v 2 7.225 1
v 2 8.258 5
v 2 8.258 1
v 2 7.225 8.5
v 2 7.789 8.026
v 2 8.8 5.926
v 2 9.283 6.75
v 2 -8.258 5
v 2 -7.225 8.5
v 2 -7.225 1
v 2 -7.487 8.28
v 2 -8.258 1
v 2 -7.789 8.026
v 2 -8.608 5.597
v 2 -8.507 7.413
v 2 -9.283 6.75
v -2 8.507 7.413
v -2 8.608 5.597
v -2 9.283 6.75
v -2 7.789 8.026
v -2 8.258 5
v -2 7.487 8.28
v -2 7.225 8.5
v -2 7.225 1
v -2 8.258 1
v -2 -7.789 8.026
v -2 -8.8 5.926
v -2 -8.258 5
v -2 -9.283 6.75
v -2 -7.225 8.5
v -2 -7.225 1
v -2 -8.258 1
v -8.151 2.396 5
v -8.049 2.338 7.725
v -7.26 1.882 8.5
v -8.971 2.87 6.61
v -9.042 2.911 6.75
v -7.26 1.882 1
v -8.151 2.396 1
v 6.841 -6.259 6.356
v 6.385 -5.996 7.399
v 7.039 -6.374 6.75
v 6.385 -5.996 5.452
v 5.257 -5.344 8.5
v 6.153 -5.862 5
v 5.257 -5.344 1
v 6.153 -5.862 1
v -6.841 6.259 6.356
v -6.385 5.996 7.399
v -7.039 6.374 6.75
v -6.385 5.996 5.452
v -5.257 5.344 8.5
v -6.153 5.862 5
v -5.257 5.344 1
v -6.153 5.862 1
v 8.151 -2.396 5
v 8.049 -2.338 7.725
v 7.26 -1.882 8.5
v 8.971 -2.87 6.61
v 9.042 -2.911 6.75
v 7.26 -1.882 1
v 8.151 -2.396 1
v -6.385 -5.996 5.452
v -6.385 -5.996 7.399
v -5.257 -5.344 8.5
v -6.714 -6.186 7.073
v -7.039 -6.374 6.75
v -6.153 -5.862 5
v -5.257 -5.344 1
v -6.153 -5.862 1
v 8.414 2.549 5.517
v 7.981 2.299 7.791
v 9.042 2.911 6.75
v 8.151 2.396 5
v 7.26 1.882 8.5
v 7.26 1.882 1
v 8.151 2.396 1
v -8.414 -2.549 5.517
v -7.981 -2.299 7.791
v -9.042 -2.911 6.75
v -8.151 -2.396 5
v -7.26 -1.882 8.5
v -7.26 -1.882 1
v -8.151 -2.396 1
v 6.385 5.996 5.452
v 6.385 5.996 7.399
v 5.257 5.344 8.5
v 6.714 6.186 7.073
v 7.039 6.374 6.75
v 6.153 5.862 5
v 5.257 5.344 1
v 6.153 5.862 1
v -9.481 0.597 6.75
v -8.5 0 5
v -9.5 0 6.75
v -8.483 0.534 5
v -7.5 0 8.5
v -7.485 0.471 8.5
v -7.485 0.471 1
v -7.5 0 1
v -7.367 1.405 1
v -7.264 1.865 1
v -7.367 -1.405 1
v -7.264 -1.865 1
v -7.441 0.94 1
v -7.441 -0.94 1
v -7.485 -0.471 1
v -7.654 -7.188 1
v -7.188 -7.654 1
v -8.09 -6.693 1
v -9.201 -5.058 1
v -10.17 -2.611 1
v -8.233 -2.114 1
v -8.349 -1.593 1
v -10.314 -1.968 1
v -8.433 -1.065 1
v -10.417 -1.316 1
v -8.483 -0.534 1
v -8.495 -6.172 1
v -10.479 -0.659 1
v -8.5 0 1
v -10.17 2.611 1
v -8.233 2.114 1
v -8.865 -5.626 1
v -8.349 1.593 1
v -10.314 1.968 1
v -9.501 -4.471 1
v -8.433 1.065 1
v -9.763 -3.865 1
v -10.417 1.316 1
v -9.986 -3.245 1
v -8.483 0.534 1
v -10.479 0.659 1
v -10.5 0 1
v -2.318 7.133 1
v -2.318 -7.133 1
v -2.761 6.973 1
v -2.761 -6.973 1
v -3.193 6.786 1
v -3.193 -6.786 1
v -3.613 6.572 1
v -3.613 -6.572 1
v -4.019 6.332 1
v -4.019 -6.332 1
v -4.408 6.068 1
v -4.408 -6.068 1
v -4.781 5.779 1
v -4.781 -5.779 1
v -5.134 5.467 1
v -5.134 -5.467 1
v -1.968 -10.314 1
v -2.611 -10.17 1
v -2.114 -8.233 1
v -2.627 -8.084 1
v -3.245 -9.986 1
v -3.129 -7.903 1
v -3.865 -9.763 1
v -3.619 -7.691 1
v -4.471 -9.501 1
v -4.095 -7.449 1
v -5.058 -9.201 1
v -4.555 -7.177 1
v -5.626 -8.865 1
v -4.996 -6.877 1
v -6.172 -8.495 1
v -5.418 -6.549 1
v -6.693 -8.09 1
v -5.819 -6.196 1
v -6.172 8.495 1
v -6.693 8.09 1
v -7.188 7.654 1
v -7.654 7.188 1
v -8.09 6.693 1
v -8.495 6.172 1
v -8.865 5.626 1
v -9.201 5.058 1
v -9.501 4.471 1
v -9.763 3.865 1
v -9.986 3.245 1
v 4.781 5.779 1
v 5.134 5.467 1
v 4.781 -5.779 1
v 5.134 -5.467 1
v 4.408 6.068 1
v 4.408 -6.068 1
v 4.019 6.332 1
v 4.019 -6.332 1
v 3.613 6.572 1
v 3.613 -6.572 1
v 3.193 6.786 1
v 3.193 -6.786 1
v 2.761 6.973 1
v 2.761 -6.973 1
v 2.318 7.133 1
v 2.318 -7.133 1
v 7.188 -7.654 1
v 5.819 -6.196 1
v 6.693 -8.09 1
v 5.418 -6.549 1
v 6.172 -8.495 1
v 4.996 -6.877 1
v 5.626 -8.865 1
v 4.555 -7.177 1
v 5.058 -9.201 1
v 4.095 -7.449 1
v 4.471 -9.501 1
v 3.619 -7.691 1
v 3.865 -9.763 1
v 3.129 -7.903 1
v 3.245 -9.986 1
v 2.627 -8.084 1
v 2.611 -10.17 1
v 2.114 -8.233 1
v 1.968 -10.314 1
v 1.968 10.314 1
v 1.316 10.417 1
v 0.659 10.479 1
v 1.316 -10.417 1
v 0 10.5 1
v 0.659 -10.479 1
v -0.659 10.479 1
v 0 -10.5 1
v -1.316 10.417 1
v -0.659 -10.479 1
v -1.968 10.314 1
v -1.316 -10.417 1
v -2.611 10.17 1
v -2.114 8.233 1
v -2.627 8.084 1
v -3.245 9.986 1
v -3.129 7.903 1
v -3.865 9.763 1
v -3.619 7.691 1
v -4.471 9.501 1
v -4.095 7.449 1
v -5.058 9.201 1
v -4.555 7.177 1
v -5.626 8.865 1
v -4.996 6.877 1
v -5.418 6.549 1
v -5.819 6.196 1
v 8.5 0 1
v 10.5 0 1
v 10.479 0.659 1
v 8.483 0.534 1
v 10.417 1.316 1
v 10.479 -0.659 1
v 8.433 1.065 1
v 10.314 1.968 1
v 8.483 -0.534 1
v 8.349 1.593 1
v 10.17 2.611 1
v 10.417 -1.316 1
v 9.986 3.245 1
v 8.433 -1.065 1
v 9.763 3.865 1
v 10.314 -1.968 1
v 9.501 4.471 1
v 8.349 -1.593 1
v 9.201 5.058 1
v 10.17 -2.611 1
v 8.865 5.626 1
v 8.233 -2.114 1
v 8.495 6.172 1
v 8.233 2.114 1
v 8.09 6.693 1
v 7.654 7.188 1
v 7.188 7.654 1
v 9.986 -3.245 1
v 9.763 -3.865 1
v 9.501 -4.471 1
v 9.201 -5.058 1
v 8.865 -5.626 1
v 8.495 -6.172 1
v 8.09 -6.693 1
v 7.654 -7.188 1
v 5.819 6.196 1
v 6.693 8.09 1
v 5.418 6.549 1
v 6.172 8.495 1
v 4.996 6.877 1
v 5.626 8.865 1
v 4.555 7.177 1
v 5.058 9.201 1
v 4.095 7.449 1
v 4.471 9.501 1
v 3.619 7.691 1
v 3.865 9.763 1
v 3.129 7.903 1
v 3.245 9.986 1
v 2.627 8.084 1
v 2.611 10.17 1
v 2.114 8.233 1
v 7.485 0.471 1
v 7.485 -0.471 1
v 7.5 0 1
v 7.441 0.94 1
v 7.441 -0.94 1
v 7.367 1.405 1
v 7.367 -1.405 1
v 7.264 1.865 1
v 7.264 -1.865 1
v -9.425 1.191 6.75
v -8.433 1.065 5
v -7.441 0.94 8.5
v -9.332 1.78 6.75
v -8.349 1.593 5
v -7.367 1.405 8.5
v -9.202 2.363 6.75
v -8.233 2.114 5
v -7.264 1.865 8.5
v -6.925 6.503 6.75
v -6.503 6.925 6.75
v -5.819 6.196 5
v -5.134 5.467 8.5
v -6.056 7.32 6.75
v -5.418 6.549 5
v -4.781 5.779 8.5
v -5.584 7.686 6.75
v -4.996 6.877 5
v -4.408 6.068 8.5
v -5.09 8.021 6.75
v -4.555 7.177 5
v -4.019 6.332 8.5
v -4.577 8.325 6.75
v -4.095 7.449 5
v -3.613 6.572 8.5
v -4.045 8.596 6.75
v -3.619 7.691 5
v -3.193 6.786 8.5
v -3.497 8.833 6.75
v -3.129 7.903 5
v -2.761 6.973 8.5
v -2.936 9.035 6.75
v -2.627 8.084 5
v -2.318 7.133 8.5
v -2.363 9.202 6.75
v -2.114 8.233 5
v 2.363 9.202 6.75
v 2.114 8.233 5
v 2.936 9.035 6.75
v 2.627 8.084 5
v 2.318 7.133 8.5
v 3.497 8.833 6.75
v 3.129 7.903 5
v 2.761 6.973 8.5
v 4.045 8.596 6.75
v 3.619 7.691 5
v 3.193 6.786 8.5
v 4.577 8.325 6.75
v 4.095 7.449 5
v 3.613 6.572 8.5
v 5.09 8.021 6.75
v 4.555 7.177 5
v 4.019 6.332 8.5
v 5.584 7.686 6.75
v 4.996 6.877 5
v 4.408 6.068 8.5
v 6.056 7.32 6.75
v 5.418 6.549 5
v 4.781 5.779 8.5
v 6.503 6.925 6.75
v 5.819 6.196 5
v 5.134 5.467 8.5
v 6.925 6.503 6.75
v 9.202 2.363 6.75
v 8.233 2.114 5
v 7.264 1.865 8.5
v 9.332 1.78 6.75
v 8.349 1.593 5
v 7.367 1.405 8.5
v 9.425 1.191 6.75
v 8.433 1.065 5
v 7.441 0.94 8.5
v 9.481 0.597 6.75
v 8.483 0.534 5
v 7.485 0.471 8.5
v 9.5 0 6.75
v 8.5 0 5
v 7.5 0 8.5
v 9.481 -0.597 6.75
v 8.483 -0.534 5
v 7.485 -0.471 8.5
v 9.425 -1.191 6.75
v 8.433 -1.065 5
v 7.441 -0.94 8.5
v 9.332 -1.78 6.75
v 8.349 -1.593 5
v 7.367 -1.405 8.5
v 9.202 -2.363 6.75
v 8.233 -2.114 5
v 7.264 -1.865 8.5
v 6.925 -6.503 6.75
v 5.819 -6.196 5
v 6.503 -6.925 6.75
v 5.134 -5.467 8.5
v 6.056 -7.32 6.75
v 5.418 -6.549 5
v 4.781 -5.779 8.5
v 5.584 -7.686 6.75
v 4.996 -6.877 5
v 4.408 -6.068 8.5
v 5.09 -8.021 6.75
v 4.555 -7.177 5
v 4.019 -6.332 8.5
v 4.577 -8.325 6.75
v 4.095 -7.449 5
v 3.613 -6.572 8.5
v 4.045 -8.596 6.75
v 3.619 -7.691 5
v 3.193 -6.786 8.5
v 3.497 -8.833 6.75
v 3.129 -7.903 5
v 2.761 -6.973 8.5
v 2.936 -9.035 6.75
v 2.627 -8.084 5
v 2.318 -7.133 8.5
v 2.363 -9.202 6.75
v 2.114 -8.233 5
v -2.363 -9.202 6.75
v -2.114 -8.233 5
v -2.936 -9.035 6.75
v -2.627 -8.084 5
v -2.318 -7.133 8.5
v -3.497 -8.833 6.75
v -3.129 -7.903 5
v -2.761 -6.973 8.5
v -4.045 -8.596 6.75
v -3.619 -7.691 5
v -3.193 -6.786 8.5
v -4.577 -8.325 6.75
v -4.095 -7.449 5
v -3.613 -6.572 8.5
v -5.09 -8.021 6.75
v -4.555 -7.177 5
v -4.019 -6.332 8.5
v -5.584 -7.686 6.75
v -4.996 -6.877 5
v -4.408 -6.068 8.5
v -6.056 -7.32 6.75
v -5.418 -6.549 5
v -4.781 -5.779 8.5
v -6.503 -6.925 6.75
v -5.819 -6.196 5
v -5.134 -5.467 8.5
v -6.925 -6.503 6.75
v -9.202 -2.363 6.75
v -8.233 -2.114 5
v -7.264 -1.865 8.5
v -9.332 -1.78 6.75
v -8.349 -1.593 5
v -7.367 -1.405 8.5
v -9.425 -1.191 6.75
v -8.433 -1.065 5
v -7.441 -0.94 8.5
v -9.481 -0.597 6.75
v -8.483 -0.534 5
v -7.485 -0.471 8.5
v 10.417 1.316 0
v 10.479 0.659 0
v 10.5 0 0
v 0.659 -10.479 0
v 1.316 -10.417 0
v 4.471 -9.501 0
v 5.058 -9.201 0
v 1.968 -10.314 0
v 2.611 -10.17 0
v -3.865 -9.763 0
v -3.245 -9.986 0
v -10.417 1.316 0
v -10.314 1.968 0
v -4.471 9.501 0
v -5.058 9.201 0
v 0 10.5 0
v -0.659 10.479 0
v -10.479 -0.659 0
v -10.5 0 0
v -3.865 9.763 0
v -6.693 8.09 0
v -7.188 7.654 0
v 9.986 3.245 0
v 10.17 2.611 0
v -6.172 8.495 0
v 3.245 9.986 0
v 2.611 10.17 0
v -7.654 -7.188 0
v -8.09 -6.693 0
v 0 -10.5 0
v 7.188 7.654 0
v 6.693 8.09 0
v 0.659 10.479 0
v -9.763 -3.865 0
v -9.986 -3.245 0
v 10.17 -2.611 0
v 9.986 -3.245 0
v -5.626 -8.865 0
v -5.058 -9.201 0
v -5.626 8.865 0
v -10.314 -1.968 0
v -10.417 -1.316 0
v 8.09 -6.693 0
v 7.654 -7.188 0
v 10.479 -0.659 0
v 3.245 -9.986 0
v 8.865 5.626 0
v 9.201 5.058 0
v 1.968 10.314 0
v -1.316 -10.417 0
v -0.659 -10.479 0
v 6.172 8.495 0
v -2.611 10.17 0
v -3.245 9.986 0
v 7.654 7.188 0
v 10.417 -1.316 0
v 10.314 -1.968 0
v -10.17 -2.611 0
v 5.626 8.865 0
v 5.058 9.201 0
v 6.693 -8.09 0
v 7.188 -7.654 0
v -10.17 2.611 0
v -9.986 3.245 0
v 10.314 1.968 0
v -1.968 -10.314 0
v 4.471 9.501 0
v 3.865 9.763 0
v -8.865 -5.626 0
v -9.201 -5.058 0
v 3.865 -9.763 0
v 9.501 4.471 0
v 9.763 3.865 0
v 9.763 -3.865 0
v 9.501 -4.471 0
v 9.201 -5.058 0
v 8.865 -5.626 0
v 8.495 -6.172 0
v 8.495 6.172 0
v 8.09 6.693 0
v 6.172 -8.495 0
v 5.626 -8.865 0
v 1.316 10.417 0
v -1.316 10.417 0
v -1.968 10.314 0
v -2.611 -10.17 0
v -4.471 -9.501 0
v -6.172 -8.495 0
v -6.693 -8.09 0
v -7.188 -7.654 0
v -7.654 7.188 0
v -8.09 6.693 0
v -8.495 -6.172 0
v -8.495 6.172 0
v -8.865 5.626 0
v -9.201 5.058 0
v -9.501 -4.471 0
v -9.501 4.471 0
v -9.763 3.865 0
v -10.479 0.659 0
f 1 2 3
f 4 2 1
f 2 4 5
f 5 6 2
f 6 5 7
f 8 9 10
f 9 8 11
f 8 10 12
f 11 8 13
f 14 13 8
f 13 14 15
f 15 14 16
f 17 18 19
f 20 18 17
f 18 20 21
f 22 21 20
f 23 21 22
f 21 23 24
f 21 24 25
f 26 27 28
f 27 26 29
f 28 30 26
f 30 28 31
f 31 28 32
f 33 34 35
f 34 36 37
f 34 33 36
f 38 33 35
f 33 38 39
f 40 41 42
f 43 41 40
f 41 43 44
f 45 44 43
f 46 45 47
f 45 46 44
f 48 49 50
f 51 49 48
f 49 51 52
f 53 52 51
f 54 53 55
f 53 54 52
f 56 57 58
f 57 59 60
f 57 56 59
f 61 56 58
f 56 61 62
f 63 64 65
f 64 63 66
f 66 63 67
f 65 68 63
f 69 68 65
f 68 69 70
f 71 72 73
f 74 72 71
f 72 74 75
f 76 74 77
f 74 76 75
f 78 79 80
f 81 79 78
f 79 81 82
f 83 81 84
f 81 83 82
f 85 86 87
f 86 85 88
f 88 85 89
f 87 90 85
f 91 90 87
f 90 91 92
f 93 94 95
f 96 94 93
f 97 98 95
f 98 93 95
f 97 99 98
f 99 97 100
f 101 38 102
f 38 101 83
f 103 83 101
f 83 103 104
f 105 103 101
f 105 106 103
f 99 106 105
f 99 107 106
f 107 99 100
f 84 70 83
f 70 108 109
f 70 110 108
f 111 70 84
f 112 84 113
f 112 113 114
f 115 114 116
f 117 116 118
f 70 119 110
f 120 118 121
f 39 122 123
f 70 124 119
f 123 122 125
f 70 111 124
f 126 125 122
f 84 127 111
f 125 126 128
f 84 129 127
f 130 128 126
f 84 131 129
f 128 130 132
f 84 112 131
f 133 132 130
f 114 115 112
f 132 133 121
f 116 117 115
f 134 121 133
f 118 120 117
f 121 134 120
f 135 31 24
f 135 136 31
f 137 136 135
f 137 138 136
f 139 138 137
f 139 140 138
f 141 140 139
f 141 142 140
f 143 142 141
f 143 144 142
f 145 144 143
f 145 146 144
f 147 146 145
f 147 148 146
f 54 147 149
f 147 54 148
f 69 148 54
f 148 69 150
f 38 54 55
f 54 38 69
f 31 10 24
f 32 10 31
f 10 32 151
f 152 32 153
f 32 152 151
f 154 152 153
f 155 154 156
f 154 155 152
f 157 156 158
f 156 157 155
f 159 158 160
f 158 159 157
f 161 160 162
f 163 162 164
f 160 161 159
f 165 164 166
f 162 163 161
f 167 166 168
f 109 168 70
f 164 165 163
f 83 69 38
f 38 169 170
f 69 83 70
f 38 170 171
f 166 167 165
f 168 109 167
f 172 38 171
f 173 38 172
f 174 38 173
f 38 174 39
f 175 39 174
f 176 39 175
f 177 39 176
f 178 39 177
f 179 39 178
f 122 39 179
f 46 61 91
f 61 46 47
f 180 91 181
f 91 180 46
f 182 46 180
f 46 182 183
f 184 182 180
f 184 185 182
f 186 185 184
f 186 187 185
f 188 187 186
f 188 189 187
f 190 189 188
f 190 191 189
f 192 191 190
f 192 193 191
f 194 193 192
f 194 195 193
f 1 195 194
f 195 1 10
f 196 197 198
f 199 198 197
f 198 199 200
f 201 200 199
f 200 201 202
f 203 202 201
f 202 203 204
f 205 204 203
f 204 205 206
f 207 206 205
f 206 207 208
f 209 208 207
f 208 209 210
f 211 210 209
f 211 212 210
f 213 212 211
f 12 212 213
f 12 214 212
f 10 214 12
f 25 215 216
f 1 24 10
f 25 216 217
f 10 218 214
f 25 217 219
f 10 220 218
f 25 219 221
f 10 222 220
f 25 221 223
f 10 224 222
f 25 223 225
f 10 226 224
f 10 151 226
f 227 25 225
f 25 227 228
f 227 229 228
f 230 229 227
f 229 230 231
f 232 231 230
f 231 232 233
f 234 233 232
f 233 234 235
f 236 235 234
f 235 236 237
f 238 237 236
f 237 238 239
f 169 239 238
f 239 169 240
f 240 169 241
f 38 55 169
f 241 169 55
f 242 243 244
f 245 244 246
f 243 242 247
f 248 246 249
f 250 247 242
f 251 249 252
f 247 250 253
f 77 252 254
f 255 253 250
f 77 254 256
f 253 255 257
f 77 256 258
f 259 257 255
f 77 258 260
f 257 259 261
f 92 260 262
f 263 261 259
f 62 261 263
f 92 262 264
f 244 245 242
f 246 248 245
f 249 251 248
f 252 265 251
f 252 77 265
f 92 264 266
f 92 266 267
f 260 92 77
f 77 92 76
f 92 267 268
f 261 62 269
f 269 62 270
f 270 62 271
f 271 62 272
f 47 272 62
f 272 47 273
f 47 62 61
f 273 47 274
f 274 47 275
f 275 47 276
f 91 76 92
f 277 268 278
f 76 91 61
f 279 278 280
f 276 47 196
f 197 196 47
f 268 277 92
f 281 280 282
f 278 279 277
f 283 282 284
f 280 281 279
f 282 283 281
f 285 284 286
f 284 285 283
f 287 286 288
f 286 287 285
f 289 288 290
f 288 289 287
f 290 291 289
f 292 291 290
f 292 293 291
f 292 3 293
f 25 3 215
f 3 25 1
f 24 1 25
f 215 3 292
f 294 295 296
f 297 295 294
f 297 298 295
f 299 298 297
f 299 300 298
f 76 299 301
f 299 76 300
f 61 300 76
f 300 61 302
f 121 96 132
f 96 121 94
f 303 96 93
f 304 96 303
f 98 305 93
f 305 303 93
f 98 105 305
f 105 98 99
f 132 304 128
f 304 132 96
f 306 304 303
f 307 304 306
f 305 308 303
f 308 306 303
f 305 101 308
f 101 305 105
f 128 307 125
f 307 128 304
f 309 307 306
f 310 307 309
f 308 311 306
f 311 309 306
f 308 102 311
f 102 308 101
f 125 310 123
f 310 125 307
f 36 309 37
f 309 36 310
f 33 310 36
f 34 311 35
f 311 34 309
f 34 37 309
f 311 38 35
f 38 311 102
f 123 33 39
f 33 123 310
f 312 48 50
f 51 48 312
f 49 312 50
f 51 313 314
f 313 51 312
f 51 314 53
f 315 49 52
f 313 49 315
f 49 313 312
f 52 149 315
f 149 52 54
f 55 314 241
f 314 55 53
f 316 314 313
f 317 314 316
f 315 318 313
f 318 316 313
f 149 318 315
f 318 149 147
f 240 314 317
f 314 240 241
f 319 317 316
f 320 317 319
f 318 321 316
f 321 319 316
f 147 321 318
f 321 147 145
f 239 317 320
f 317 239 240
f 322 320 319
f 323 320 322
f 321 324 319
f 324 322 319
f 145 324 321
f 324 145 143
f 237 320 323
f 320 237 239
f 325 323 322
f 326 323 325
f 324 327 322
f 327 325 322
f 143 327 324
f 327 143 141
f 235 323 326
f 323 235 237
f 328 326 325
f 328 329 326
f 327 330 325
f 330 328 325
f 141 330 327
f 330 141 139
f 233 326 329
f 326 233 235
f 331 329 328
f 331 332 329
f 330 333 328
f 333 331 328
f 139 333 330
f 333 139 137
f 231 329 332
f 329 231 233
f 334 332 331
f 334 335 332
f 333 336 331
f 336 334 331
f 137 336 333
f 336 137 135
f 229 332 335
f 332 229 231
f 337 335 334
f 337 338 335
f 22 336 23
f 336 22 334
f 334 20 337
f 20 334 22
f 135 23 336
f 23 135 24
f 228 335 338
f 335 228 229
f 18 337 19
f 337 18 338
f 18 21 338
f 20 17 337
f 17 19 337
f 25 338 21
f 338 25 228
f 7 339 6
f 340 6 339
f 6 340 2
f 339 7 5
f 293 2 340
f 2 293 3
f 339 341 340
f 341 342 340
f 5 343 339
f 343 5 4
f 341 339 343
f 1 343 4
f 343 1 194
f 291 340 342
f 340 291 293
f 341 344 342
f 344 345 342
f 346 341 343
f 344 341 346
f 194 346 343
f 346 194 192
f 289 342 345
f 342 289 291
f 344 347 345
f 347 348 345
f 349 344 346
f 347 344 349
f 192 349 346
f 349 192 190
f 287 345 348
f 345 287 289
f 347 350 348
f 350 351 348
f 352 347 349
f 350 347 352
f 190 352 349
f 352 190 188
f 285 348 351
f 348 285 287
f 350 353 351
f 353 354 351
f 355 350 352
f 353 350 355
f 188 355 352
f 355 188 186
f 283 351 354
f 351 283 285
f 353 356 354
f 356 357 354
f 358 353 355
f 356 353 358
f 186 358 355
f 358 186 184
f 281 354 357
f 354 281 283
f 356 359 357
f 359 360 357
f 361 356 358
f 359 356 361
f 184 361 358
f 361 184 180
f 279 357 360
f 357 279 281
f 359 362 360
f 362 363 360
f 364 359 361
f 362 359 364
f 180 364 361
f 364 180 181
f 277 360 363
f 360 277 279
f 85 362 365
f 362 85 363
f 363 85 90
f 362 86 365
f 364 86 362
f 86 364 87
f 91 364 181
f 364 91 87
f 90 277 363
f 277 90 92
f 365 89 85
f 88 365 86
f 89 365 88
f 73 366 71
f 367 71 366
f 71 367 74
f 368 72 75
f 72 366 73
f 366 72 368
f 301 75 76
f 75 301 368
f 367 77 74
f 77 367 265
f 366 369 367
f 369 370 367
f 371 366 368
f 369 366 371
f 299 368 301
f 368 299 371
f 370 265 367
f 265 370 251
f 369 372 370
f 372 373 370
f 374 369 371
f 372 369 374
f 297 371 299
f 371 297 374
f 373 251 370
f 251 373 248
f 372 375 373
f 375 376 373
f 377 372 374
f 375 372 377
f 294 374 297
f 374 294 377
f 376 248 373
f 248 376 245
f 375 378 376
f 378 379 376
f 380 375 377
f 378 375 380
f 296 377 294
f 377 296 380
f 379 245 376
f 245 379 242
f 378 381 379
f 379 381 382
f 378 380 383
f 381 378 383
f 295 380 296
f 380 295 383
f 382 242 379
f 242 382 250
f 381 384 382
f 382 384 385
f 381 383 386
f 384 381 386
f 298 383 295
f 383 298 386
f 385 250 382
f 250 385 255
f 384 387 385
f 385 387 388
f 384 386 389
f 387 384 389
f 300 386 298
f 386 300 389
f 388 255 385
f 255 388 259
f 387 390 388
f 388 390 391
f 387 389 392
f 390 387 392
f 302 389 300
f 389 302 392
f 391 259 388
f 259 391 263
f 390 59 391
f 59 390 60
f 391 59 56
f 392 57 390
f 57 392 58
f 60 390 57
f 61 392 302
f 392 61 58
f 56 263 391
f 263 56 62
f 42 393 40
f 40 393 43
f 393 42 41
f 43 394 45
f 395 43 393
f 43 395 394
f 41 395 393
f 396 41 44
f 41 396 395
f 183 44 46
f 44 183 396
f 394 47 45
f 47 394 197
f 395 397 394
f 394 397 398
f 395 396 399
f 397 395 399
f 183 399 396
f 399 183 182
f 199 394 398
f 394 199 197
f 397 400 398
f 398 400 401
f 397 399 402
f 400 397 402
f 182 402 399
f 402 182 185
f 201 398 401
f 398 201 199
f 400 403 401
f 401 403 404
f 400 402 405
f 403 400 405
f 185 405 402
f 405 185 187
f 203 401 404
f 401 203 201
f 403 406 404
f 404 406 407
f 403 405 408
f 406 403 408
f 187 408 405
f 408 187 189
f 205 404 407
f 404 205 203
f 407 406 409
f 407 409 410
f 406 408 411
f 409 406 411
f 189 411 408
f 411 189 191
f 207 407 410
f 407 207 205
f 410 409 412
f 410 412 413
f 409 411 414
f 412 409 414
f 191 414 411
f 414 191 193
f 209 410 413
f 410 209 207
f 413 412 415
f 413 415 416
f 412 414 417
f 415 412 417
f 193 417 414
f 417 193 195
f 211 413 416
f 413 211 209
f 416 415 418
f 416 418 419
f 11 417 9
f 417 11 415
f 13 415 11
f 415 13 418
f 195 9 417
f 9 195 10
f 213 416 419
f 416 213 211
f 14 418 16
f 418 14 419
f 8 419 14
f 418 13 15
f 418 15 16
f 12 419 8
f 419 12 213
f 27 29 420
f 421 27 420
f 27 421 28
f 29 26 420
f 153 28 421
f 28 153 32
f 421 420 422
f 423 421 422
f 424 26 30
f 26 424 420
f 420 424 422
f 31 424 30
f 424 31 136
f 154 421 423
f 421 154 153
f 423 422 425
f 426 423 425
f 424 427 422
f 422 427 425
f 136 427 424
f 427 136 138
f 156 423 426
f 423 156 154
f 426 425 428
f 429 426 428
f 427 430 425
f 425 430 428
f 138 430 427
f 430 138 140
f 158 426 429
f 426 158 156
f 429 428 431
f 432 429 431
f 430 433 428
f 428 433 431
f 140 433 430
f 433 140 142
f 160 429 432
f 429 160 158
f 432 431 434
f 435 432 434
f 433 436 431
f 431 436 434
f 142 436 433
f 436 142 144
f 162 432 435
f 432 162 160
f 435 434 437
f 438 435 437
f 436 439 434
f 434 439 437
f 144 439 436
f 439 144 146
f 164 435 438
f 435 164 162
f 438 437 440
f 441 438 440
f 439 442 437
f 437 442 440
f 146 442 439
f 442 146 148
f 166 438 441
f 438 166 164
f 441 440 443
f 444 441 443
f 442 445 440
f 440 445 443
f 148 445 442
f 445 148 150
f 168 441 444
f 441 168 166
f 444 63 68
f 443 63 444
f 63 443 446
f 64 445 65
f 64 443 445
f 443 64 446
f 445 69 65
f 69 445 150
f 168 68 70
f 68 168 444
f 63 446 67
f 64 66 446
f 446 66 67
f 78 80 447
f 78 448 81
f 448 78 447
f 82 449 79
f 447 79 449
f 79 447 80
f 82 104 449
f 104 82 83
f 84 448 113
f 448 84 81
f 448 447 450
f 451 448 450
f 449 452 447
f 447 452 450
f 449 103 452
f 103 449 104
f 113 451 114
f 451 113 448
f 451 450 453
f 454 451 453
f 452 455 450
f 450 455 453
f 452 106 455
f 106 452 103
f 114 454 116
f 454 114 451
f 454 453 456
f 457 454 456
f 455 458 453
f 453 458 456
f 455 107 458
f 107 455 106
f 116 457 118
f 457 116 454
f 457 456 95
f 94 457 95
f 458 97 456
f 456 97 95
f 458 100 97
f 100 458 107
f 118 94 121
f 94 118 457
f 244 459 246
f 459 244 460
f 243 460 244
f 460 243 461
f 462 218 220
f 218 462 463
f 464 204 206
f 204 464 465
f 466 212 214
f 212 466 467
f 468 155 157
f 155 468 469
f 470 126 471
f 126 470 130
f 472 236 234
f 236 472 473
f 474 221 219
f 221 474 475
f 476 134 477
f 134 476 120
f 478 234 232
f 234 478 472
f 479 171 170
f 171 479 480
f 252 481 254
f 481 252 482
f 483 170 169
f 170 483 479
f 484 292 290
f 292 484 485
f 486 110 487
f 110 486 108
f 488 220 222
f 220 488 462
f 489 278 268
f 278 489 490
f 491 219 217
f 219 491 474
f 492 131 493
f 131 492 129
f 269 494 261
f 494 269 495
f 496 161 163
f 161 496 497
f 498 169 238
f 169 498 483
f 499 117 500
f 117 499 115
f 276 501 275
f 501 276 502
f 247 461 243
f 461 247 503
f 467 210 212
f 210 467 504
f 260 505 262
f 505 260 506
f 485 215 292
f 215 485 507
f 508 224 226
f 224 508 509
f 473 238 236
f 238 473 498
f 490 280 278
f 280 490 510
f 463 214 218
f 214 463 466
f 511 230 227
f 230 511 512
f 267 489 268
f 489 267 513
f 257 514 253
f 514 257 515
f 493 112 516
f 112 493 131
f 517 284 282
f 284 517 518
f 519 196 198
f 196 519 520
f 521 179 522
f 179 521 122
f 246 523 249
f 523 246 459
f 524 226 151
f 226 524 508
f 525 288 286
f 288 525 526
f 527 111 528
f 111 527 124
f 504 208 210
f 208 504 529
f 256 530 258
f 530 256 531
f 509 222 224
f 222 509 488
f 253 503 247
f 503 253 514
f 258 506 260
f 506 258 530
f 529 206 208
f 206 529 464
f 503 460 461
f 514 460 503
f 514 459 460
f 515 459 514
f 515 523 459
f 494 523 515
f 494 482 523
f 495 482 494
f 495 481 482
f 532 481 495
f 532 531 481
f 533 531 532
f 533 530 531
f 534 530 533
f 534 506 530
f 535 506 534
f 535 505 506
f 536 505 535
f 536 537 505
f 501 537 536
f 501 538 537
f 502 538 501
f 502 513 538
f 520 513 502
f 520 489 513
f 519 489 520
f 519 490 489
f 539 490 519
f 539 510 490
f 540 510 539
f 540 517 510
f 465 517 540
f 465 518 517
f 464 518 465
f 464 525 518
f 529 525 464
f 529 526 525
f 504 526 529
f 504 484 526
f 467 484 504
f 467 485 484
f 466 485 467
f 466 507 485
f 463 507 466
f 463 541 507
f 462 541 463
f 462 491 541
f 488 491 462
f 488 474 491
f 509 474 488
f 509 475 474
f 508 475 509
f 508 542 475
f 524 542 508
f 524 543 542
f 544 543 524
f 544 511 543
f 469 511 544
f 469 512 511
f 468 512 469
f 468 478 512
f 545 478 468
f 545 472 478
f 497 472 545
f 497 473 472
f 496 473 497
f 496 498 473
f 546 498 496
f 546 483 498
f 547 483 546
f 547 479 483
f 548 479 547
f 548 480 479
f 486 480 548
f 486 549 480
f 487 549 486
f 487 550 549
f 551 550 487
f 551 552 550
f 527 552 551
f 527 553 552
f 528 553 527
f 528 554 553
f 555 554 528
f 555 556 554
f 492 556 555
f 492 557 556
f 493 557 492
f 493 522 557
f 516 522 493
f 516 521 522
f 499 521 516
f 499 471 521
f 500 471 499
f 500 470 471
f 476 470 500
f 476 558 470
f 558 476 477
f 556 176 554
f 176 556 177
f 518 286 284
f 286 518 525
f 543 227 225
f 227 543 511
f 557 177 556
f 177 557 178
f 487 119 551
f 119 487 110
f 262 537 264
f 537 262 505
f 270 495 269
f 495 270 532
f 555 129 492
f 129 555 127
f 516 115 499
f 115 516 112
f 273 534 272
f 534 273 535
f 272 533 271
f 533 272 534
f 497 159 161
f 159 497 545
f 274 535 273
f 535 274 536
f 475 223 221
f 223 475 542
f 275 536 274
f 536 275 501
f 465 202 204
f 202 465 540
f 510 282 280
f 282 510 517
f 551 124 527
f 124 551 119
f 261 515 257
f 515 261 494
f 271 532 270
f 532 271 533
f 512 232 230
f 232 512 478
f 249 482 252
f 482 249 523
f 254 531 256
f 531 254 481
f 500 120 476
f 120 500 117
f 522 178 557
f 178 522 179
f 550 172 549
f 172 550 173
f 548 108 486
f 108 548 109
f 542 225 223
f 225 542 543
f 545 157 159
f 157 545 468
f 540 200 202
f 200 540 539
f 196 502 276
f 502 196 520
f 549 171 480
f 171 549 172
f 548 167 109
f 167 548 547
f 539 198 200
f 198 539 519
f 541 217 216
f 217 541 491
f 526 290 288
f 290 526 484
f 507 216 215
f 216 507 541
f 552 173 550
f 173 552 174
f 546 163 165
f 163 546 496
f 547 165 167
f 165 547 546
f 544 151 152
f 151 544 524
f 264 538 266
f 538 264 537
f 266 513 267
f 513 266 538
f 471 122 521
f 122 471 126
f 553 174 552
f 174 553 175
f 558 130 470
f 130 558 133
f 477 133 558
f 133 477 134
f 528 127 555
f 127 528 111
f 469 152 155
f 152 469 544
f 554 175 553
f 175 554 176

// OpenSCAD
r1 = 8.5; //the radius of the opening
r2 = 9.5; //the radius of the groove
v1 = 7.5; //the length of the opening
v2 = 4; //the height of the groove
v3 = 1; //height of lid
r3 = 10.5; //the radius of the lid
wall = 1; //Wall thickness
$fn=100; //extermination

module zapadka()
{
   polygon(points=[[r1-wall,0],[r1-wall,v1],[r2,v2+((v1-v2)/2)],[r1,v2],[r1,0]]);
}

module vycko()
{
   cylinder(r=r3, h=v3);
   difference()
   {
      union()
      {
         translate([0,0,v3]) rotate_extrude() zapadka();  
      }
      union()
      {
         for(i=[0:60:360])
         {
            rotate([0,0,i]) cube([4,r2*3,v1*3],center=true);
         }
      }
   }
}

vycko();
